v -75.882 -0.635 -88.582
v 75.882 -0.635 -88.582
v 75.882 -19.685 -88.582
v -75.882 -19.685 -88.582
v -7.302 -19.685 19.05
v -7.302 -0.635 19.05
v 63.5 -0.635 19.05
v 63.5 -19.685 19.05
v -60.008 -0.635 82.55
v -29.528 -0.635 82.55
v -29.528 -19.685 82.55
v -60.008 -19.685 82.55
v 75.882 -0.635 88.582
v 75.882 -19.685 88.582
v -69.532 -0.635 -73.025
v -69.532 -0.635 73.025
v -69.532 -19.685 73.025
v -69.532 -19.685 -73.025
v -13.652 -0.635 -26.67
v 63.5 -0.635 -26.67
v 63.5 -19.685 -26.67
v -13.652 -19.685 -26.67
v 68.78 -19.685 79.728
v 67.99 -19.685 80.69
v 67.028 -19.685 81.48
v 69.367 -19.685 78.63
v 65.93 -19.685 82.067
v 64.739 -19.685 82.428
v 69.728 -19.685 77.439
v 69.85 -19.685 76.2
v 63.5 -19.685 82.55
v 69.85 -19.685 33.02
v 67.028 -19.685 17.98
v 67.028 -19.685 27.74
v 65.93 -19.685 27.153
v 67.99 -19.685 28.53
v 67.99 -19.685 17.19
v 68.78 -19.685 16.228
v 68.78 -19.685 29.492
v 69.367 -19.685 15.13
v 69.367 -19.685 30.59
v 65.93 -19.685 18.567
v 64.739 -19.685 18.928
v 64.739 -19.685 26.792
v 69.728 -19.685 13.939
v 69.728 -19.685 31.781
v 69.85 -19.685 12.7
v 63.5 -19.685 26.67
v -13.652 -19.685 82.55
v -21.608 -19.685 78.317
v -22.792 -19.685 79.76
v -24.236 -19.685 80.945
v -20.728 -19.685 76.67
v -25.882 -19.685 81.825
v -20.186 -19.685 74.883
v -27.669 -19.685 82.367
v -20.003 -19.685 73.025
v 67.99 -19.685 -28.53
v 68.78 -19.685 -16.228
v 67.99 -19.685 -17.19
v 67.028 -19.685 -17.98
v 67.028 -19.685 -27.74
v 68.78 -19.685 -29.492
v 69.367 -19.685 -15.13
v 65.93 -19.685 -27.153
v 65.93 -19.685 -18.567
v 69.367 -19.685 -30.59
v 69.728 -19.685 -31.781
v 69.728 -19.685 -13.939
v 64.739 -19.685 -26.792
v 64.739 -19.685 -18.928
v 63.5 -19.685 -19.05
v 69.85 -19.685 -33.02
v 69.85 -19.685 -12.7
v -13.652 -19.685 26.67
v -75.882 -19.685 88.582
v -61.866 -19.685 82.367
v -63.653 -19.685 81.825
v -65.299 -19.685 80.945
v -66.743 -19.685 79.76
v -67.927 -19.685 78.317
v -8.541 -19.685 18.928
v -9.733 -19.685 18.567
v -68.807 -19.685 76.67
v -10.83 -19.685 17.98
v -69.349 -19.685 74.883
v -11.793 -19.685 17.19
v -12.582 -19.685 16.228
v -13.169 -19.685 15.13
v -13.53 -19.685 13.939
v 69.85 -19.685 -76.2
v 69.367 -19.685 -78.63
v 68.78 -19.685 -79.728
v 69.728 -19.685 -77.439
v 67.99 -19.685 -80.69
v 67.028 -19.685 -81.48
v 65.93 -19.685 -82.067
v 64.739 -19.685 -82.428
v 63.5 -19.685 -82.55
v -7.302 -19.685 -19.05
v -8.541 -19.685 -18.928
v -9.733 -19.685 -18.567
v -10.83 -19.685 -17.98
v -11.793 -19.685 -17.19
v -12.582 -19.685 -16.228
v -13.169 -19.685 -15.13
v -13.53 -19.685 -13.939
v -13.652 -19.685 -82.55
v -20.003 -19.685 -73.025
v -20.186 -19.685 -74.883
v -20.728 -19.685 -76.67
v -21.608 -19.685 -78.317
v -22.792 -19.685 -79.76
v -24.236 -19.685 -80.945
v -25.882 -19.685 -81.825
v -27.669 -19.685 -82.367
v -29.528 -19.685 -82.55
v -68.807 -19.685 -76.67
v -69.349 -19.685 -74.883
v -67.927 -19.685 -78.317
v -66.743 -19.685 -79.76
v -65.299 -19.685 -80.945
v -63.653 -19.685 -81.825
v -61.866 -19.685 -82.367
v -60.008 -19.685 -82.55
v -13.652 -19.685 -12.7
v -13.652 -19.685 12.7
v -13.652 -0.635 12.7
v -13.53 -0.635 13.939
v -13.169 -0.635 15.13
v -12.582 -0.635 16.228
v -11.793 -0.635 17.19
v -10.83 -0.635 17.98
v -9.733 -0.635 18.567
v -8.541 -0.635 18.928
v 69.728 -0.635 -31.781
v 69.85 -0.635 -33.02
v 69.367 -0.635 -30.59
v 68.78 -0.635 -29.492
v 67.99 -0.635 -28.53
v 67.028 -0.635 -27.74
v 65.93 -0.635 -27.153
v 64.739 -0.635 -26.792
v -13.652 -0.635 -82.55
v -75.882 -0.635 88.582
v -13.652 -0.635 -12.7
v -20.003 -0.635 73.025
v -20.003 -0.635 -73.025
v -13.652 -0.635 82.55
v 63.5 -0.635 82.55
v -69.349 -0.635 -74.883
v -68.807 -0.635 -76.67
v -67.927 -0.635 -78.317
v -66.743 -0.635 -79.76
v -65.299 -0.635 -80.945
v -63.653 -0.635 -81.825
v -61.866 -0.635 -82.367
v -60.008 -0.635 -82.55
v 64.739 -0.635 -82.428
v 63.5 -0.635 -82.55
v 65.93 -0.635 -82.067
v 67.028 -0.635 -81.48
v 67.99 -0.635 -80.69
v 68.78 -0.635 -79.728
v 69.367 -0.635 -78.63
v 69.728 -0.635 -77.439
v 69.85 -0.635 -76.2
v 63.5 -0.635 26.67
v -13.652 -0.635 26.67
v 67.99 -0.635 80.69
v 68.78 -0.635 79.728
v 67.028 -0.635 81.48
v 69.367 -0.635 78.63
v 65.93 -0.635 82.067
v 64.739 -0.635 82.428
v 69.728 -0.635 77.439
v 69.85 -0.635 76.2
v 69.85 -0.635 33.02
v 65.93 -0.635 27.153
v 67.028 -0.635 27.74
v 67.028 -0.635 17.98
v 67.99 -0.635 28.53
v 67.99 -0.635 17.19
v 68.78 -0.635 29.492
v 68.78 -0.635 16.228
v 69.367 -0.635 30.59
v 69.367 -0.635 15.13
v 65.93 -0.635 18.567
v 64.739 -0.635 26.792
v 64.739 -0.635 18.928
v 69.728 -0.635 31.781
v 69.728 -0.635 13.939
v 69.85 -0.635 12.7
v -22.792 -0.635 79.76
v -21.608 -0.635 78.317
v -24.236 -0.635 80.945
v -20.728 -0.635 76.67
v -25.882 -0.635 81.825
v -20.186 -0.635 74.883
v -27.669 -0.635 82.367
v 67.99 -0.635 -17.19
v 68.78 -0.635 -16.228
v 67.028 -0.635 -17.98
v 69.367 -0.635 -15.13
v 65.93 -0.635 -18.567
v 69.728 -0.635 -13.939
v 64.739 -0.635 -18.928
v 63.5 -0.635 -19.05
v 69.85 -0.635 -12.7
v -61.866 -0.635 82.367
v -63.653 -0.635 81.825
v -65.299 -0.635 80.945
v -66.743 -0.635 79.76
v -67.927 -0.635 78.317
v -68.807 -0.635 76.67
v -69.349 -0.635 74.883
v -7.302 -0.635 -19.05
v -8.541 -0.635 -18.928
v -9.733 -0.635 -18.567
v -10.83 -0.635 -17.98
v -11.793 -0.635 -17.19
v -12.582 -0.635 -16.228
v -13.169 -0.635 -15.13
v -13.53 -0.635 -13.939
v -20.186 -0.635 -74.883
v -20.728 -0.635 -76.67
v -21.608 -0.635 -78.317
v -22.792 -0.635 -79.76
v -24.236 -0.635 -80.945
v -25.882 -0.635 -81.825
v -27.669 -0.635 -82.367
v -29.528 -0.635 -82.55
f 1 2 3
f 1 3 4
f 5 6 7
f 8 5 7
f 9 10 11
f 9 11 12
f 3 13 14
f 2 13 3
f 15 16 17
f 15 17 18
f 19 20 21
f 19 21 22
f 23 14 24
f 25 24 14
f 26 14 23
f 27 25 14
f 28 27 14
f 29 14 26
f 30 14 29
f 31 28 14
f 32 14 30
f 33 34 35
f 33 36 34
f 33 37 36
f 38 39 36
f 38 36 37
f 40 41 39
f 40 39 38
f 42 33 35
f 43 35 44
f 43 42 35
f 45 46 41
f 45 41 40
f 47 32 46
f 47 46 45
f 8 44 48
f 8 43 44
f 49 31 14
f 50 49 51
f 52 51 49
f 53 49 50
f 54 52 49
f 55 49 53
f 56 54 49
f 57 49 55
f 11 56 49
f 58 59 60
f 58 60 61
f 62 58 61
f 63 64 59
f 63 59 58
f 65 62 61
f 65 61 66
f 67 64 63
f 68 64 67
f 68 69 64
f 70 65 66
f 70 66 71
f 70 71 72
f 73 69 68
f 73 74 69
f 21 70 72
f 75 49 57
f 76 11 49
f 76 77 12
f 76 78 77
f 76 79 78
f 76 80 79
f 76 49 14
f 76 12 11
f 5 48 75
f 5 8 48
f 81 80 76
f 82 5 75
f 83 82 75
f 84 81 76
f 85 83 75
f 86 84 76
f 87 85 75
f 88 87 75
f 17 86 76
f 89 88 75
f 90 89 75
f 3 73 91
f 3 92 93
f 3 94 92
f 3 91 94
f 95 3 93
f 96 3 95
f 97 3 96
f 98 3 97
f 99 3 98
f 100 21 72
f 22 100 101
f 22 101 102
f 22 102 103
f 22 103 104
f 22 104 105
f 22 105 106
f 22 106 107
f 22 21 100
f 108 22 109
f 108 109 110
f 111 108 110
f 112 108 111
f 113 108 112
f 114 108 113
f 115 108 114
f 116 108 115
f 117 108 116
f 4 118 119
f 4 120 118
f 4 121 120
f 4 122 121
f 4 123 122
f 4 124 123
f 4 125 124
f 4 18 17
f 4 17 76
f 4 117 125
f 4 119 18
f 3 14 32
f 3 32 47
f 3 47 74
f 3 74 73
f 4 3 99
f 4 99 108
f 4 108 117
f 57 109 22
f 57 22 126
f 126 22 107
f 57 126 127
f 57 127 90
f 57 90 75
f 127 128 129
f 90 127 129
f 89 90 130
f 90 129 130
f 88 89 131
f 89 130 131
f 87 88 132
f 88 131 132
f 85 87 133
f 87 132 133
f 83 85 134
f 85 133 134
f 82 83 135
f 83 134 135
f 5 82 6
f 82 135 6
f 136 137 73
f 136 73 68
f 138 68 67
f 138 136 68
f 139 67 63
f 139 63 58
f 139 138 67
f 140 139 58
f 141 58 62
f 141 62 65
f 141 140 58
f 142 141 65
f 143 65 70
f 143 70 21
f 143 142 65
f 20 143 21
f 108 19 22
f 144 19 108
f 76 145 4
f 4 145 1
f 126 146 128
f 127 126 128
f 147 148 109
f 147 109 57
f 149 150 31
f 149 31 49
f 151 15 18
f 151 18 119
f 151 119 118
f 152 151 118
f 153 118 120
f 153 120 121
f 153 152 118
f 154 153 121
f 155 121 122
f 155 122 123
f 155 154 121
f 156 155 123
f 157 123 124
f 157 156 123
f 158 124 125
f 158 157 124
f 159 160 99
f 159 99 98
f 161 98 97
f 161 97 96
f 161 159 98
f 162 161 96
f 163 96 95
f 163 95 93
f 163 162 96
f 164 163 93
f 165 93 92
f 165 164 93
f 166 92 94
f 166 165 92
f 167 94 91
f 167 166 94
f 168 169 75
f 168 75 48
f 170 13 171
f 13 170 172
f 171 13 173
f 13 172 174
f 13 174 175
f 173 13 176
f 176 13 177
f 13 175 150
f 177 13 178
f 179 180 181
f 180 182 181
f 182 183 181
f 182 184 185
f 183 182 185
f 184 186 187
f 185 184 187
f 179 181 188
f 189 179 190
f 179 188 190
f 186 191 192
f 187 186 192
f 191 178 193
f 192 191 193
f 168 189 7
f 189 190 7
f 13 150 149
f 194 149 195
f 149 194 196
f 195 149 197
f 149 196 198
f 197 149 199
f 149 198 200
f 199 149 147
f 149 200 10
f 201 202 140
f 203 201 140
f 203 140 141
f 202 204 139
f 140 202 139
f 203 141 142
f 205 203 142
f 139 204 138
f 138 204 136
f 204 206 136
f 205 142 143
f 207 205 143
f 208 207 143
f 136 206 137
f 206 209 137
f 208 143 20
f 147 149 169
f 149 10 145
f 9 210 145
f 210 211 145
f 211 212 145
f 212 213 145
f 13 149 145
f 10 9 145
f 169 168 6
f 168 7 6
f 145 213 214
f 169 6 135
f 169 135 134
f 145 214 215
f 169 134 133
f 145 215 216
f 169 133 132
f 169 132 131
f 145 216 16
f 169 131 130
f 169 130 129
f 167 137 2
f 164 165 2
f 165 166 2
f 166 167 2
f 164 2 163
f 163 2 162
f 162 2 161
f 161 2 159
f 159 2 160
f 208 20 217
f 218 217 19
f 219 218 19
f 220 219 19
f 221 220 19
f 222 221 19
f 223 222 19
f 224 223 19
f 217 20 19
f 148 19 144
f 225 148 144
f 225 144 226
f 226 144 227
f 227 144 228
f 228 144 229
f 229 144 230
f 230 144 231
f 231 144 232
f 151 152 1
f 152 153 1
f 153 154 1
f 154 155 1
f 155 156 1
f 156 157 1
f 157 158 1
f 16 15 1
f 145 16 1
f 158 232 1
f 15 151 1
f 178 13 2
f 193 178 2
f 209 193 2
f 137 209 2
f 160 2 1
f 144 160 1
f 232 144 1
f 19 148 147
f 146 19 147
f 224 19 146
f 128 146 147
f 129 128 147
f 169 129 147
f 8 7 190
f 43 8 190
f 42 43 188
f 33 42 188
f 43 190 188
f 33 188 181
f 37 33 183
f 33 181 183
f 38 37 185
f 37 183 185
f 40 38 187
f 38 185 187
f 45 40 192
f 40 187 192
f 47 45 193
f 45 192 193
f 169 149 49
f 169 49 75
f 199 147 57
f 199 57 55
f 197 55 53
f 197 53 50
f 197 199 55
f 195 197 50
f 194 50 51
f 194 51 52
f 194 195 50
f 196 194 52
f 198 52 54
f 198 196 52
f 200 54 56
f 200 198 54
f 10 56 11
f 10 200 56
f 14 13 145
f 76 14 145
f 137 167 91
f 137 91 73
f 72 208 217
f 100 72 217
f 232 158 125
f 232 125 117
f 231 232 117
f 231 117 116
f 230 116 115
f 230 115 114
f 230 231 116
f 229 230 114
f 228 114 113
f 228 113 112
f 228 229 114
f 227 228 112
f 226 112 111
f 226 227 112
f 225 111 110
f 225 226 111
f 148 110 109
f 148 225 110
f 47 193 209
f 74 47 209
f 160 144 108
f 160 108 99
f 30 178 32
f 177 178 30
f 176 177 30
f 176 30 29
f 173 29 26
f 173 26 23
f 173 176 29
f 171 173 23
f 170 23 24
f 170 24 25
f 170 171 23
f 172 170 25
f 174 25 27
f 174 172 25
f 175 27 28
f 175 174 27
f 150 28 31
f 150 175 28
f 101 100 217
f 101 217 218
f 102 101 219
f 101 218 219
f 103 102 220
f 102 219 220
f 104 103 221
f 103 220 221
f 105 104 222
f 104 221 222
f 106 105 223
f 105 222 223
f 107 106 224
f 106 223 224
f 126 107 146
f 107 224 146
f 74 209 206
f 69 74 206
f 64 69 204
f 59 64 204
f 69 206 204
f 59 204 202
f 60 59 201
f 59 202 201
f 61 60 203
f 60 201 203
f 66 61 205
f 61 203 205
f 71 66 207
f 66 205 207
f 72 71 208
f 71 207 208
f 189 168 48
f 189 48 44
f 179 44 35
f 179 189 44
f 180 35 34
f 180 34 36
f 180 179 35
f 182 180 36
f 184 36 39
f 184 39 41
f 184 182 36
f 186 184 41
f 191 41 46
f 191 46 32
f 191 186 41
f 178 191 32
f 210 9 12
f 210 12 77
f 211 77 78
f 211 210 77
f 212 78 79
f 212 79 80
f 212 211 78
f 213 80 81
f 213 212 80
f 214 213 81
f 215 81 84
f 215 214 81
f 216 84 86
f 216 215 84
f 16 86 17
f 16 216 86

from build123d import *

# Parameters (mm, degrees)
SKETCH1_W           = 151.765
SKETCH1_H           = 177.165
BOSS_EXTRUDE1_DEPTH = 19.05


with BuildPart() as part:
    # Sketch1 → Boss-Extrude1 (new body)
    with BuildSketch(Plane(origin=(0, -0.635, 0), x_dir=(-1, 0, 0), z_dir=(0, -1, 0))):
        Rectangle(SKETCH1_W, SKETCH1_H)
        with BuildLine():
            Line((13.6525, 26.67), (13.6525, 82.55))
            Line((13.6525, 82.55), (-63.5, 82.55))
            ThreePointArc((-63.5, 82.55), (-67.990128061, 80.690128061), (-69.85, 76.2))
            Line((-69.85, 76.2), (-69.85, 33.02))
            ThreePointArc((-69.85, 33.02), (-67.990128061, 28.529871939), (-63.5, 26.67))
            Line((-63.5, 26.67), (13.6525, 26.67))
        make_face(mode=Mode.SUBTRACT)
        with BuildLine():
            Line((13.6525, -82.55), (13.6525, -26.67))
            Line((13.6525, -26.67), (-63.5, -26.67))
            ThreePointArc((-63.5, -26.67), (-67.990128061, -28.529871939), (-69.85, -33.02))
            Line((-69.85, -33.02), (-69.85, -76.2))
            ThreePointArc((-69.85, -76.2), (-67.990128061, -80.690128061), (-63.5, -82.55))
            Line((-63.5, -82.55), (13.6525, -82.55))
        make_face(mode=Mode.SUBTRACT)
        with BuildLine():
            Line((7.3025, -19.05), (-63.5, -19.05))
            ThreePointArc((-63.5, -19.05), (-67.990128061, -17.190128061), (-69.85, -12.7))
            Line((-69.85, -12.7), (-69.85, 12.7))
            ThreePointArc((-69.85, 12.7), (-67.990128061, 17.190128061), (-63.5, 19.05))
            Line((-63.5, 19.05), (7.3025, 19.05))
            ThreePointArc((7.3025, 19.05), (11.792628061, 17.190128061), (13.6525, 12.7))
            Line((13.6525, 12.7), (13.6525, -12.7))
            ThreePointArc((13.6525, -12.7), (11.792628061, -17.190128061), (7.3025, -19.05))
        make_face(mode=Mode.SUBTRACT)
        with BuildLine():
            Line((29.5275, -82.55), (60.0075, -82.55))
            ThreePointArc((60.0075, -82.55), (66.742692091, -79.760192091), (69.5325, -73.025))
            Line((69.5325, -73.025), (69.5325, 73.025))
            ThreePointArc((69.5325, 73.025), (66.742692091, 79.760192091), (60.0075, 82.55))
            Line((60.0075, 82.55), (29.5275, 82.55))
            ThreePointArc((29.5275, 82.55), (22.792307909, 79.760192091), (20.0025, 73.025))
            Line((20.0025, 73.025), (20.0025, -73.025))
            ThreePointArc((20.0025, -73.025), (22.792307909, -79.760192091), (29.5275, -82.55))
        make_face(mode=Mode.SUBTRACT)
    extrude(amount=BOSS_EXTRUDE1_DEPTH)


solid = part.part
